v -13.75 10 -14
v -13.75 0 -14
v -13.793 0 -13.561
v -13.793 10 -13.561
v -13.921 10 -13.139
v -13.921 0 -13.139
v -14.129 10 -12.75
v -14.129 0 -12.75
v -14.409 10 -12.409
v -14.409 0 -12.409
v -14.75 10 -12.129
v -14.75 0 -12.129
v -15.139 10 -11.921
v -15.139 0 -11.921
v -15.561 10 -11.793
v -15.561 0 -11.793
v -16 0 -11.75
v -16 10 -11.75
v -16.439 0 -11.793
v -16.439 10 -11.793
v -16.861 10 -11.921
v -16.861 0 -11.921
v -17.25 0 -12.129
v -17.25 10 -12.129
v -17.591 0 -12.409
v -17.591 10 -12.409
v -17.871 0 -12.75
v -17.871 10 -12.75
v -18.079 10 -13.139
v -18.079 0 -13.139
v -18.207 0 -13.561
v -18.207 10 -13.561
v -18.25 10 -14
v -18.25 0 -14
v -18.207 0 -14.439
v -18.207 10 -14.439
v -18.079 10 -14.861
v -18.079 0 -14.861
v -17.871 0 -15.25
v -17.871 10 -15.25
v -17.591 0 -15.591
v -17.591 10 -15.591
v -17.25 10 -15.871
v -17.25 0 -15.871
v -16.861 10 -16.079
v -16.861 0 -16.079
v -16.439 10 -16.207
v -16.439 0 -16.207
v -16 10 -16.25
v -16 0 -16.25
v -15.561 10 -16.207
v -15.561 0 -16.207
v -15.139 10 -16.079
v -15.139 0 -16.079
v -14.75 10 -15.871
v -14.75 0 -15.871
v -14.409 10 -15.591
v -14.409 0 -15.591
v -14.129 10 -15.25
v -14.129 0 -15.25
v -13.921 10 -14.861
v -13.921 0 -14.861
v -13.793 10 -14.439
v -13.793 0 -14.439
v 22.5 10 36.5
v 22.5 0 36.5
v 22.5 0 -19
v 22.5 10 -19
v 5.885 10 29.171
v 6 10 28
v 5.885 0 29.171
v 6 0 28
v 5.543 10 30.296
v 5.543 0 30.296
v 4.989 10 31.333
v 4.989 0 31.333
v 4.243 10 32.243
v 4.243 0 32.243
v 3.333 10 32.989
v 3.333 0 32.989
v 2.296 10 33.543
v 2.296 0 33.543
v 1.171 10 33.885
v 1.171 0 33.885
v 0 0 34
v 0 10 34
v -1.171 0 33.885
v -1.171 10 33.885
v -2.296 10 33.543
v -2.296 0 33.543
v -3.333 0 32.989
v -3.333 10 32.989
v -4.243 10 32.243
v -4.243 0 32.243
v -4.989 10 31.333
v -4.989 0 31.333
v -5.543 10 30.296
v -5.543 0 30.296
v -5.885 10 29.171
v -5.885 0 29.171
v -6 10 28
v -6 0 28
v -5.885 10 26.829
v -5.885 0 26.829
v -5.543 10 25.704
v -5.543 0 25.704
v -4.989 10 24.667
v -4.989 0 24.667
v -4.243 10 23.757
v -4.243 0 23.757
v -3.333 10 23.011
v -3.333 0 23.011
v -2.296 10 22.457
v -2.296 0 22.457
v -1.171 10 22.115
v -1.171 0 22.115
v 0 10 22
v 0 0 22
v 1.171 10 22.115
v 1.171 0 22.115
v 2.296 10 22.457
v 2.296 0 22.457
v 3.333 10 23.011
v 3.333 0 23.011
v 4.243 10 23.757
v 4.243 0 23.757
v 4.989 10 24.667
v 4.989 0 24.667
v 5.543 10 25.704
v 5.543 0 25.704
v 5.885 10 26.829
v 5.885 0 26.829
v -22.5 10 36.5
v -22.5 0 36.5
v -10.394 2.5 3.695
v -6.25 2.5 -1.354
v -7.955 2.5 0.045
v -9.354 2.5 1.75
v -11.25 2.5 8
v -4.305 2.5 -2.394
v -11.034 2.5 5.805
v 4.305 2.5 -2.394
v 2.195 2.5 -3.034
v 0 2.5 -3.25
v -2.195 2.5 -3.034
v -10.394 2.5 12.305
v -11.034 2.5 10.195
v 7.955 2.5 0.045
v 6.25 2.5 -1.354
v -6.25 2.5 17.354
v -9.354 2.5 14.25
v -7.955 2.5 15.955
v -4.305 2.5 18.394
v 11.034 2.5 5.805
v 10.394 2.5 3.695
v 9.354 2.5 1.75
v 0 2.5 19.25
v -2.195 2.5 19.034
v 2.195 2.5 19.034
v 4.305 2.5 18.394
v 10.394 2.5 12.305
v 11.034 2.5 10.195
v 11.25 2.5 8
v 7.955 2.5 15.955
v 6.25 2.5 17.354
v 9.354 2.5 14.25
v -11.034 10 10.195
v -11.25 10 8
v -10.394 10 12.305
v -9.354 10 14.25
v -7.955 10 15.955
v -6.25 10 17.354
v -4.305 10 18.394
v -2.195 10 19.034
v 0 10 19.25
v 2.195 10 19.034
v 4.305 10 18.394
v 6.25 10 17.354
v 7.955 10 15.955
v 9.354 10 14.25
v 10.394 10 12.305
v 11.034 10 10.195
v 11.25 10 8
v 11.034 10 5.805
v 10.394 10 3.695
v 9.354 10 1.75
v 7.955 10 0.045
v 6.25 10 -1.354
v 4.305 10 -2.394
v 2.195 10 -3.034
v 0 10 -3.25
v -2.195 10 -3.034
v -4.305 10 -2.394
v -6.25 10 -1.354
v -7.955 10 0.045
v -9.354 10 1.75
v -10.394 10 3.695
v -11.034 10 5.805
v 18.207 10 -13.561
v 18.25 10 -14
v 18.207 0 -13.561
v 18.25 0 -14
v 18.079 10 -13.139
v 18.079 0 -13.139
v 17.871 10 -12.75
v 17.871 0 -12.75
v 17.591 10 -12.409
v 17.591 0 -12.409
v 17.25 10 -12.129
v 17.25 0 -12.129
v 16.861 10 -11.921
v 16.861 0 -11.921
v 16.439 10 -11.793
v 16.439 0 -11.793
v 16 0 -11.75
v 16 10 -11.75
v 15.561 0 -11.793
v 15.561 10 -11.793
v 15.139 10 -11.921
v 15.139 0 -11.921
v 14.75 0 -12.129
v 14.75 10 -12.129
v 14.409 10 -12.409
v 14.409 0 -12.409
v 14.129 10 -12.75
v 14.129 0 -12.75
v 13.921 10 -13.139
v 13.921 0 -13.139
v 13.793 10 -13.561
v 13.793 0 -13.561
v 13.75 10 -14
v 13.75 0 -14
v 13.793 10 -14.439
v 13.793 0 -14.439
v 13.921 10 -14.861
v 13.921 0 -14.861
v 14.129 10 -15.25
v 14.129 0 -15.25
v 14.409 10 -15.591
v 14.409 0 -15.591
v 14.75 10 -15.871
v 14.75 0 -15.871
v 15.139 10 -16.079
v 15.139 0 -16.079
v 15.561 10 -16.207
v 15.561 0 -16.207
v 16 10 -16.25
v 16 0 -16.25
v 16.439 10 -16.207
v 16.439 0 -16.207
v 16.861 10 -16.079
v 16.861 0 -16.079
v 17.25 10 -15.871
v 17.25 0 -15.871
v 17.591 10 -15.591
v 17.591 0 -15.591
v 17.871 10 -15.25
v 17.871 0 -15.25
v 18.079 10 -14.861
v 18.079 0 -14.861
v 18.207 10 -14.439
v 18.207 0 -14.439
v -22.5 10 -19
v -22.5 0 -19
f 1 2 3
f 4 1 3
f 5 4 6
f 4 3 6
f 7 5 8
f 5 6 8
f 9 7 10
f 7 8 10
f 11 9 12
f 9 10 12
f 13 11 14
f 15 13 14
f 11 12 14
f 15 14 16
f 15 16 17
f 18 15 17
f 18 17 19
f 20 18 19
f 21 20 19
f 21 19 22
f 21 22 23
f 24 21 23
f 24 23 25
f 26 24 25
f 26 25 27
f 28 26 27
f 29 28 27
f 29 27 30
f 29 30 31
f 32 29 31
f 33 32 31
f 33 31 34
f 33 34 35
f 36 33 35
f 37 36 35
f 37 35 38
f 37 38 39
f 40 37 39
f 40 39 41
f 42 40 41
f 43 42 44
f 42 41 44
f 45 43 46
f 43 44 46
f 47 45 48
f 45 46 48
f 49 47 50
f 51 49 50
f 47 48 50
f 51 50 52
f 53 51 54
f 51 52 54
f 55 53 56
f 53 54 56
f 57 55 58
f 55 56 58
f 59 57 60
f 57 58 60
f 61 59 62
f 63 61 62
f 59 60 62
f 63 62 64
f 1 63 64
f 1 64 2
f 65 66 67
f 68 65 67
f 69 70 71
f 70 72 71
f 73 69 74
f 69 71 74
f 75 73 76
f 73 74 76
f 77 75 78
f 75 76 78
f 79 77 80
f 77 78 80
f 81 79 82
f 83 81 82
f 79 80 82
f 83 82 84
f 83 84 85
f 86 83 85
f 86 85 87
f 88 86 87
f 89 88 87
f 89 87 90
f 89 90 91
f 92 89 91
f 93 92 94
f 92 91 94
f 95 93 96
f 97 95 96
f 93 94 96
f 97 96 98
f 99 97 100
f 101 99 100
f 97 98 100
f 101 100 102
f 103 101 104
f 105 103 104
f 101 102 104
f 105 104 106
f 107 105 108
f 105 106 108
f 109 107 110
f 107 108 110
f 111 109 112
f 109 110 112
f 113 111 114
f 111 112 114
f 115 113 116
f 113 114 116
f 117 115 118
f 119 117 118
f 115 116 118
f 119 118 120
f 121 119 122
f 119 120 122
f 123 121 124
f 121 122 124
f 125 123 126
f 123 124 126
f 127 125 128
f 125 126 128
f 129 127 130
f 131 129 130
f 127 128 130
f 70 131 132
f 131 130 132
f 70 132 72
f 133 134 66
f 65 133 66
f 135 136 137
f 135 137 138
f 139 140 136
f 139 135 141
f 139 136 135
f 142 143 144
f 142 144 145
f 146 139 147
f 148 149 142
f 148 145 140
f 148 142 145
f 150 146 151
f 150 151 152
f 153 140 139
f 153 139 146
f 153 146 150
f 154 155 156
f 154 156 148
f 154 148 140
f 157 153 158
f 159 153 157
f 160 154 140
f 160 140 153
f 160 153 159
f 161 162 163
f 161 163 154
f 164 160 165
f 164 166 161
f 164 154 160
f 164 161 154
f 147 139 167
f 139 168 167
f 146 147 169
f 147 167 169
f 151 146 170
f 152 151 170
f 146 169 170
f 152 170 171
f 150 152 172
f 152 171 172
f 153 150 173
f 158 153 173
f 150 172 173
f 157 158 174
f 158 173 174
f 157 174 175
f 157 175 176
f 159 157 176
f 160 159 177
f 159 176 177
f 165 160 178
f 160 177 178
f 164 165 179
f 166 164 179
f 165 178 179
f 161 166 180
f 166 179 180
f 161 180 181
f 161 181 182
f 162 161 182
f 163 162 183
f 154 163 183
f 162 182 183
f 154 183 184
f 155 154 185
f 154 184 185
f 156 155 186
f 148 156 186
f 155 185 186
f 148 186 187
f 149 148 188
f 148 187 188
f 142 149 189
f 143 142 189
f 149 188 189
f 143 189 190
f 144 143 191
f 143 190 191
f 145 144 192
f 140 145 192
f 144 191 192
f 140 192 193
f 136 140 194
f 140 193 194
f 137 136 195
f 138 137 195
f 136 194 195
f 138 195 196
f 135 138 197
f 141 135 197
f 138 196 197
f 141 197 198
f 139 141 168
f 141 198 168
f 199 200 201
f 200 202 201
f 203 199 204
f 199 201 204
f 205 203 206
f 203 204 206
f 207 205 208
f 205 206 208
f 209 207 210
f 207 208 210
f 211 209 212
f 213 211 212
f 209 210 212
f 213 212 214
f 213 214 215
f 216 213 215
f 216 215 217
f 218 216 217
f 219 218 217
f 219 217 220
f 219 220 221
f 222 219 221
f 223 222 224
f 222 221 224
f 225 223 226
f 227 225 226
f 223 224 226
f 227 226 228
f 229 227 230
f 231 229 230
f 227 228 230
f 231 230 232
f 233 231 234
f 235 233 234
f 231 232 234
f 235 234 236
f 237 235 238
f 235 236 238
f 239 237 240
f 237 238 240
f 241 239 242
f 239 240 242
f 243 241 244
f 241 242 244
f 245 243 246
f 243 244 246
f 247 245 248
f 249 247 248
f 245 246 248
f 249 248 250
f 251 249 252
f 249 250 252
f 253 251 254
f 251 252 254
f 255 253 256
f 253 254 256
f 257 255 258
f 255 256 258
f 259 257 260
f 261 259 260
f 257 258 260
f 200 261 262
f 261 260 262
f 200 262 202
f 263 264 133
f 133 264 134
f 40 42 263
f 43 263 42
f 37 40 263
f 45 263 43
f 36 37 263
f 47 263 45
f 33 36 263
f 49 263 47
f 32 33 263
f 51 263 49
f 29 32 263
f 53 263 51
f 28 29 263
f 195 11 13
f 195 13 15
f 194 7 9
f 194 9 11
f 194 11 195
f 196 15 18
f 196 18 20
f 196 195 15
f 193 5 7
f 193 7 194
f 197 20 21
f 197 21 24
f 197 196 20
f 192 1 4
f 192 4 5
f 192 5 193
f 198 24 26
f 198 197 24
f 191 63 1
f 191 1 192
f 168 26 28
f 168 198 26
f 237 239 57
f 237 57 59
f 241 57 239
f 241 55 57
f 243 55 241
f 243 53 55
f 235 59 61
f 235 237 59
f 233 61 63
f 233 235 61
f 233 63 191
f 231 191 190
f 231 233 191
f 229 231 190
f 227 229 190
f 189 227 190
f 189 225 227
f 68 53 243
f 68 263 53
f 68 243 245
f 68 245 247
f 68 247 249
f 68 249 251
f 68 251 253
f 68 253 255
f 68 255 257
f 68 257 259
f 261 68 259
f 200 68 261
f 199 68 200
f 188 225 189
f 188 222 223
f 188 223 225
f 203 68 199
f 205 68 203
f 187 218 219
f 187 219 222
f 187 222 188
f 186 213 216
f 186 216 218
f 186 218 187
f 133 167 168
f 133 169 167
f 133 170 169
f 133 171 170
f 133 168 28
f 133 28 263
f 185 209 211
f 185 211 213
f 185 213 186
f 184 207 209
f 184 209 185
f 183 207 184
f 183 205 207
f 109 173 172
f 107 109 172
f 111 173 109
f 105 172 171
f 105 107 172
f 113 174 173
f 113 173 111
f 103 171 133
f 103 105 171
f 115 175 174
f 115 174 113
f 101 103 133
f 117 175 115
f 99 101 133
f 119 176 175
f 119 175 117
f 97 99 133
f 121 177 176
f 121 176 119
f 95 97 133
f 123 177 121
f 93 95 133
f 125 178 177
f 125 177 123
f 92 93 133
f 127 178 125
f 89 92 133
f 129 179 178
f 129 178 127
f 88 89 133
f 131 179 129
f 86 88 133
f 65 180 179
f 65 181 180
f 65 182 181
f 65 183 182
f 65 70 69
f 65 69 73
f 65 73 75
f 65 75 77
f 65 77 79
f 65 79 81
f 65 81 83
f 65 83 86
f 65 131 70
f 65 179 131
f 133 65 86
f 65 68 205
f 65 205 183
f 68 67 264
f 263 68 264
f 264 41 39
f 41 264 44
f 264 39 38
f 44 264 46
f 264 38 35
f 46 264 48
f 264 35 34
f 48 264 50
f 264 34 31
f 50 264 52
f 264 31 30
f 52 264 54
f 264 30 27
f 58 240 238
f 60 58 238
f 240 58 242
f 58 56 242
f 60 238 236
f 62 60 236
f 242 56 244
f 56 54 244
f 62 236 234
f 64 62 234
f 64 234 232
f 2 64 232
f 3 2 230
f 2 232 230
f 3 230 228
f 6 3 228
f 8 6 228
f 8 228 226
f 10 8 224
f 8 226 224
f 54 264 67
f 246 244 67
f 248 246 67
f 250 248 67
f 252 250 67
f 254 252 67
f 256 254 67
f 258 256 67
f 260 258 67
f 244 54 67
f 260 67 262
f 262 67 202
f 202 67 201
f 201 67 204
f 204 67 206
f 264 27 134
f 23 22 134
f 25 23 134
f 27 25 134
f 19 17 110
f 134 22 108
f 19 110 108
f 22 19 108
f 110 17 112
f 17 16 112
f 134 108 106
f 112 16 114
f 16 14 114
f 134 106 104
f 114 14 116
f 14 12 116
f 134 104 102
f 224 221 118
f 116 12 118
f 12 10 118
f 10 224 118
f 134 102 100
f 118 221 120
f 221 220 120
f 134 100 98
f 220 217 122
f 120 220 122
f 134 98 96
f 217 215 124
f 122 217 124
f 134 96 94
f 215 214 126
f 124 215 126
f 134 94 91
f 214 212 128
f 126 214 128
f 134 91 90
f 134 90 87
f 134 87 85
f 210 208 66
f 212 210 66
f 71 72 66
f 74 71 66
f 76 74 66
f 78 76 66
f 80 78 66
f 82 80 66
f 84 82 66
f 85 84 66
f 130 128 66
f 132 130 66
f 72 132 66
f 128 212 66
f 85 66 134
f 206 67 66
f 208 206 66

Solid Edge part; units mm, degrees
sketch "Sketch1" plane through (0, 0, 0) normal (0, -1, 0) x (1, 0, 0)
  line L0 (22.5, 36.5) -> (22.5, -19)
  line L1 (22.5, -19) -> (-22.5, -19)
  line L2 (-22.5, -19) -> (-22.5, 36.5)
  line L3 (-22.5, 36.5) -> (22.5, 36.5)
  circle A0 centre (0, 28) radius 6
  circle A1 centre (0, 8) radius 4.6
  dimension "D1" = 9.2
  dimension "D2" = 8
  dimension "D3" = 11.2
  dimension "D4" = 5.6
  dimension "D5" = 15
  dimension "D6" = 22
  dimension "D7" = 45
  dimension "D8" = 5
  dimension "D9" = 13.5
  dimension "D10" = 12
  dimension "D11" = 20
  dimension "D12" = 6.5
  dimension "D13" = 6.5
  dimension "D14" = 4.5
extrude "Protrusion1" add sketch "Sketch1" against normal blind 10
sketch "Sketch2" plane through (0, 10, 4.6) normal (0, 1, 0) x (-1, 0, 0)
  circle A0 centre (0, 3.4) radius 11.25
extrude "ExtrudedCutout_1" cut sketch "Sketch2" against normal blind 7.5
sketch "Sketch3" plane through (0, 2.5, 8) normal (0, 1, 0) x (-1, 0, 0)
  circle A0 centre (0, 0) radius 4.6
extrude "Protrusion2" add sketch "Sketch3" against normal up to vertex (2.5 mm away)
sketch "Sketch4" plane through (0, 0, 0) normal (0, -1, 0) x (1, 0, 0)
  circle A0 centre (-16, -14) radius 2.25
  circle A1 centre (16, -14) radius 2.25
  dimension "D1" = 9.2
  dimension "D2" = 8
  dimension "D3" = 11.2
  dimension "D4" = 5.6
  dimension "D5" = 15
  dimension "D6" = 22
  dimension "D7" = 45
  dimension "D8" = 5
  dimension "D9" = 13.5
  dimension "D10" = 12
  dimension "D11" = 20
  dimension "D12" = 6.5
  dimension "D13" = 6.5
  dimension "D14" = 4.5
extrude "Cutout1" cut sketch "Sketch4" against normal up to next
